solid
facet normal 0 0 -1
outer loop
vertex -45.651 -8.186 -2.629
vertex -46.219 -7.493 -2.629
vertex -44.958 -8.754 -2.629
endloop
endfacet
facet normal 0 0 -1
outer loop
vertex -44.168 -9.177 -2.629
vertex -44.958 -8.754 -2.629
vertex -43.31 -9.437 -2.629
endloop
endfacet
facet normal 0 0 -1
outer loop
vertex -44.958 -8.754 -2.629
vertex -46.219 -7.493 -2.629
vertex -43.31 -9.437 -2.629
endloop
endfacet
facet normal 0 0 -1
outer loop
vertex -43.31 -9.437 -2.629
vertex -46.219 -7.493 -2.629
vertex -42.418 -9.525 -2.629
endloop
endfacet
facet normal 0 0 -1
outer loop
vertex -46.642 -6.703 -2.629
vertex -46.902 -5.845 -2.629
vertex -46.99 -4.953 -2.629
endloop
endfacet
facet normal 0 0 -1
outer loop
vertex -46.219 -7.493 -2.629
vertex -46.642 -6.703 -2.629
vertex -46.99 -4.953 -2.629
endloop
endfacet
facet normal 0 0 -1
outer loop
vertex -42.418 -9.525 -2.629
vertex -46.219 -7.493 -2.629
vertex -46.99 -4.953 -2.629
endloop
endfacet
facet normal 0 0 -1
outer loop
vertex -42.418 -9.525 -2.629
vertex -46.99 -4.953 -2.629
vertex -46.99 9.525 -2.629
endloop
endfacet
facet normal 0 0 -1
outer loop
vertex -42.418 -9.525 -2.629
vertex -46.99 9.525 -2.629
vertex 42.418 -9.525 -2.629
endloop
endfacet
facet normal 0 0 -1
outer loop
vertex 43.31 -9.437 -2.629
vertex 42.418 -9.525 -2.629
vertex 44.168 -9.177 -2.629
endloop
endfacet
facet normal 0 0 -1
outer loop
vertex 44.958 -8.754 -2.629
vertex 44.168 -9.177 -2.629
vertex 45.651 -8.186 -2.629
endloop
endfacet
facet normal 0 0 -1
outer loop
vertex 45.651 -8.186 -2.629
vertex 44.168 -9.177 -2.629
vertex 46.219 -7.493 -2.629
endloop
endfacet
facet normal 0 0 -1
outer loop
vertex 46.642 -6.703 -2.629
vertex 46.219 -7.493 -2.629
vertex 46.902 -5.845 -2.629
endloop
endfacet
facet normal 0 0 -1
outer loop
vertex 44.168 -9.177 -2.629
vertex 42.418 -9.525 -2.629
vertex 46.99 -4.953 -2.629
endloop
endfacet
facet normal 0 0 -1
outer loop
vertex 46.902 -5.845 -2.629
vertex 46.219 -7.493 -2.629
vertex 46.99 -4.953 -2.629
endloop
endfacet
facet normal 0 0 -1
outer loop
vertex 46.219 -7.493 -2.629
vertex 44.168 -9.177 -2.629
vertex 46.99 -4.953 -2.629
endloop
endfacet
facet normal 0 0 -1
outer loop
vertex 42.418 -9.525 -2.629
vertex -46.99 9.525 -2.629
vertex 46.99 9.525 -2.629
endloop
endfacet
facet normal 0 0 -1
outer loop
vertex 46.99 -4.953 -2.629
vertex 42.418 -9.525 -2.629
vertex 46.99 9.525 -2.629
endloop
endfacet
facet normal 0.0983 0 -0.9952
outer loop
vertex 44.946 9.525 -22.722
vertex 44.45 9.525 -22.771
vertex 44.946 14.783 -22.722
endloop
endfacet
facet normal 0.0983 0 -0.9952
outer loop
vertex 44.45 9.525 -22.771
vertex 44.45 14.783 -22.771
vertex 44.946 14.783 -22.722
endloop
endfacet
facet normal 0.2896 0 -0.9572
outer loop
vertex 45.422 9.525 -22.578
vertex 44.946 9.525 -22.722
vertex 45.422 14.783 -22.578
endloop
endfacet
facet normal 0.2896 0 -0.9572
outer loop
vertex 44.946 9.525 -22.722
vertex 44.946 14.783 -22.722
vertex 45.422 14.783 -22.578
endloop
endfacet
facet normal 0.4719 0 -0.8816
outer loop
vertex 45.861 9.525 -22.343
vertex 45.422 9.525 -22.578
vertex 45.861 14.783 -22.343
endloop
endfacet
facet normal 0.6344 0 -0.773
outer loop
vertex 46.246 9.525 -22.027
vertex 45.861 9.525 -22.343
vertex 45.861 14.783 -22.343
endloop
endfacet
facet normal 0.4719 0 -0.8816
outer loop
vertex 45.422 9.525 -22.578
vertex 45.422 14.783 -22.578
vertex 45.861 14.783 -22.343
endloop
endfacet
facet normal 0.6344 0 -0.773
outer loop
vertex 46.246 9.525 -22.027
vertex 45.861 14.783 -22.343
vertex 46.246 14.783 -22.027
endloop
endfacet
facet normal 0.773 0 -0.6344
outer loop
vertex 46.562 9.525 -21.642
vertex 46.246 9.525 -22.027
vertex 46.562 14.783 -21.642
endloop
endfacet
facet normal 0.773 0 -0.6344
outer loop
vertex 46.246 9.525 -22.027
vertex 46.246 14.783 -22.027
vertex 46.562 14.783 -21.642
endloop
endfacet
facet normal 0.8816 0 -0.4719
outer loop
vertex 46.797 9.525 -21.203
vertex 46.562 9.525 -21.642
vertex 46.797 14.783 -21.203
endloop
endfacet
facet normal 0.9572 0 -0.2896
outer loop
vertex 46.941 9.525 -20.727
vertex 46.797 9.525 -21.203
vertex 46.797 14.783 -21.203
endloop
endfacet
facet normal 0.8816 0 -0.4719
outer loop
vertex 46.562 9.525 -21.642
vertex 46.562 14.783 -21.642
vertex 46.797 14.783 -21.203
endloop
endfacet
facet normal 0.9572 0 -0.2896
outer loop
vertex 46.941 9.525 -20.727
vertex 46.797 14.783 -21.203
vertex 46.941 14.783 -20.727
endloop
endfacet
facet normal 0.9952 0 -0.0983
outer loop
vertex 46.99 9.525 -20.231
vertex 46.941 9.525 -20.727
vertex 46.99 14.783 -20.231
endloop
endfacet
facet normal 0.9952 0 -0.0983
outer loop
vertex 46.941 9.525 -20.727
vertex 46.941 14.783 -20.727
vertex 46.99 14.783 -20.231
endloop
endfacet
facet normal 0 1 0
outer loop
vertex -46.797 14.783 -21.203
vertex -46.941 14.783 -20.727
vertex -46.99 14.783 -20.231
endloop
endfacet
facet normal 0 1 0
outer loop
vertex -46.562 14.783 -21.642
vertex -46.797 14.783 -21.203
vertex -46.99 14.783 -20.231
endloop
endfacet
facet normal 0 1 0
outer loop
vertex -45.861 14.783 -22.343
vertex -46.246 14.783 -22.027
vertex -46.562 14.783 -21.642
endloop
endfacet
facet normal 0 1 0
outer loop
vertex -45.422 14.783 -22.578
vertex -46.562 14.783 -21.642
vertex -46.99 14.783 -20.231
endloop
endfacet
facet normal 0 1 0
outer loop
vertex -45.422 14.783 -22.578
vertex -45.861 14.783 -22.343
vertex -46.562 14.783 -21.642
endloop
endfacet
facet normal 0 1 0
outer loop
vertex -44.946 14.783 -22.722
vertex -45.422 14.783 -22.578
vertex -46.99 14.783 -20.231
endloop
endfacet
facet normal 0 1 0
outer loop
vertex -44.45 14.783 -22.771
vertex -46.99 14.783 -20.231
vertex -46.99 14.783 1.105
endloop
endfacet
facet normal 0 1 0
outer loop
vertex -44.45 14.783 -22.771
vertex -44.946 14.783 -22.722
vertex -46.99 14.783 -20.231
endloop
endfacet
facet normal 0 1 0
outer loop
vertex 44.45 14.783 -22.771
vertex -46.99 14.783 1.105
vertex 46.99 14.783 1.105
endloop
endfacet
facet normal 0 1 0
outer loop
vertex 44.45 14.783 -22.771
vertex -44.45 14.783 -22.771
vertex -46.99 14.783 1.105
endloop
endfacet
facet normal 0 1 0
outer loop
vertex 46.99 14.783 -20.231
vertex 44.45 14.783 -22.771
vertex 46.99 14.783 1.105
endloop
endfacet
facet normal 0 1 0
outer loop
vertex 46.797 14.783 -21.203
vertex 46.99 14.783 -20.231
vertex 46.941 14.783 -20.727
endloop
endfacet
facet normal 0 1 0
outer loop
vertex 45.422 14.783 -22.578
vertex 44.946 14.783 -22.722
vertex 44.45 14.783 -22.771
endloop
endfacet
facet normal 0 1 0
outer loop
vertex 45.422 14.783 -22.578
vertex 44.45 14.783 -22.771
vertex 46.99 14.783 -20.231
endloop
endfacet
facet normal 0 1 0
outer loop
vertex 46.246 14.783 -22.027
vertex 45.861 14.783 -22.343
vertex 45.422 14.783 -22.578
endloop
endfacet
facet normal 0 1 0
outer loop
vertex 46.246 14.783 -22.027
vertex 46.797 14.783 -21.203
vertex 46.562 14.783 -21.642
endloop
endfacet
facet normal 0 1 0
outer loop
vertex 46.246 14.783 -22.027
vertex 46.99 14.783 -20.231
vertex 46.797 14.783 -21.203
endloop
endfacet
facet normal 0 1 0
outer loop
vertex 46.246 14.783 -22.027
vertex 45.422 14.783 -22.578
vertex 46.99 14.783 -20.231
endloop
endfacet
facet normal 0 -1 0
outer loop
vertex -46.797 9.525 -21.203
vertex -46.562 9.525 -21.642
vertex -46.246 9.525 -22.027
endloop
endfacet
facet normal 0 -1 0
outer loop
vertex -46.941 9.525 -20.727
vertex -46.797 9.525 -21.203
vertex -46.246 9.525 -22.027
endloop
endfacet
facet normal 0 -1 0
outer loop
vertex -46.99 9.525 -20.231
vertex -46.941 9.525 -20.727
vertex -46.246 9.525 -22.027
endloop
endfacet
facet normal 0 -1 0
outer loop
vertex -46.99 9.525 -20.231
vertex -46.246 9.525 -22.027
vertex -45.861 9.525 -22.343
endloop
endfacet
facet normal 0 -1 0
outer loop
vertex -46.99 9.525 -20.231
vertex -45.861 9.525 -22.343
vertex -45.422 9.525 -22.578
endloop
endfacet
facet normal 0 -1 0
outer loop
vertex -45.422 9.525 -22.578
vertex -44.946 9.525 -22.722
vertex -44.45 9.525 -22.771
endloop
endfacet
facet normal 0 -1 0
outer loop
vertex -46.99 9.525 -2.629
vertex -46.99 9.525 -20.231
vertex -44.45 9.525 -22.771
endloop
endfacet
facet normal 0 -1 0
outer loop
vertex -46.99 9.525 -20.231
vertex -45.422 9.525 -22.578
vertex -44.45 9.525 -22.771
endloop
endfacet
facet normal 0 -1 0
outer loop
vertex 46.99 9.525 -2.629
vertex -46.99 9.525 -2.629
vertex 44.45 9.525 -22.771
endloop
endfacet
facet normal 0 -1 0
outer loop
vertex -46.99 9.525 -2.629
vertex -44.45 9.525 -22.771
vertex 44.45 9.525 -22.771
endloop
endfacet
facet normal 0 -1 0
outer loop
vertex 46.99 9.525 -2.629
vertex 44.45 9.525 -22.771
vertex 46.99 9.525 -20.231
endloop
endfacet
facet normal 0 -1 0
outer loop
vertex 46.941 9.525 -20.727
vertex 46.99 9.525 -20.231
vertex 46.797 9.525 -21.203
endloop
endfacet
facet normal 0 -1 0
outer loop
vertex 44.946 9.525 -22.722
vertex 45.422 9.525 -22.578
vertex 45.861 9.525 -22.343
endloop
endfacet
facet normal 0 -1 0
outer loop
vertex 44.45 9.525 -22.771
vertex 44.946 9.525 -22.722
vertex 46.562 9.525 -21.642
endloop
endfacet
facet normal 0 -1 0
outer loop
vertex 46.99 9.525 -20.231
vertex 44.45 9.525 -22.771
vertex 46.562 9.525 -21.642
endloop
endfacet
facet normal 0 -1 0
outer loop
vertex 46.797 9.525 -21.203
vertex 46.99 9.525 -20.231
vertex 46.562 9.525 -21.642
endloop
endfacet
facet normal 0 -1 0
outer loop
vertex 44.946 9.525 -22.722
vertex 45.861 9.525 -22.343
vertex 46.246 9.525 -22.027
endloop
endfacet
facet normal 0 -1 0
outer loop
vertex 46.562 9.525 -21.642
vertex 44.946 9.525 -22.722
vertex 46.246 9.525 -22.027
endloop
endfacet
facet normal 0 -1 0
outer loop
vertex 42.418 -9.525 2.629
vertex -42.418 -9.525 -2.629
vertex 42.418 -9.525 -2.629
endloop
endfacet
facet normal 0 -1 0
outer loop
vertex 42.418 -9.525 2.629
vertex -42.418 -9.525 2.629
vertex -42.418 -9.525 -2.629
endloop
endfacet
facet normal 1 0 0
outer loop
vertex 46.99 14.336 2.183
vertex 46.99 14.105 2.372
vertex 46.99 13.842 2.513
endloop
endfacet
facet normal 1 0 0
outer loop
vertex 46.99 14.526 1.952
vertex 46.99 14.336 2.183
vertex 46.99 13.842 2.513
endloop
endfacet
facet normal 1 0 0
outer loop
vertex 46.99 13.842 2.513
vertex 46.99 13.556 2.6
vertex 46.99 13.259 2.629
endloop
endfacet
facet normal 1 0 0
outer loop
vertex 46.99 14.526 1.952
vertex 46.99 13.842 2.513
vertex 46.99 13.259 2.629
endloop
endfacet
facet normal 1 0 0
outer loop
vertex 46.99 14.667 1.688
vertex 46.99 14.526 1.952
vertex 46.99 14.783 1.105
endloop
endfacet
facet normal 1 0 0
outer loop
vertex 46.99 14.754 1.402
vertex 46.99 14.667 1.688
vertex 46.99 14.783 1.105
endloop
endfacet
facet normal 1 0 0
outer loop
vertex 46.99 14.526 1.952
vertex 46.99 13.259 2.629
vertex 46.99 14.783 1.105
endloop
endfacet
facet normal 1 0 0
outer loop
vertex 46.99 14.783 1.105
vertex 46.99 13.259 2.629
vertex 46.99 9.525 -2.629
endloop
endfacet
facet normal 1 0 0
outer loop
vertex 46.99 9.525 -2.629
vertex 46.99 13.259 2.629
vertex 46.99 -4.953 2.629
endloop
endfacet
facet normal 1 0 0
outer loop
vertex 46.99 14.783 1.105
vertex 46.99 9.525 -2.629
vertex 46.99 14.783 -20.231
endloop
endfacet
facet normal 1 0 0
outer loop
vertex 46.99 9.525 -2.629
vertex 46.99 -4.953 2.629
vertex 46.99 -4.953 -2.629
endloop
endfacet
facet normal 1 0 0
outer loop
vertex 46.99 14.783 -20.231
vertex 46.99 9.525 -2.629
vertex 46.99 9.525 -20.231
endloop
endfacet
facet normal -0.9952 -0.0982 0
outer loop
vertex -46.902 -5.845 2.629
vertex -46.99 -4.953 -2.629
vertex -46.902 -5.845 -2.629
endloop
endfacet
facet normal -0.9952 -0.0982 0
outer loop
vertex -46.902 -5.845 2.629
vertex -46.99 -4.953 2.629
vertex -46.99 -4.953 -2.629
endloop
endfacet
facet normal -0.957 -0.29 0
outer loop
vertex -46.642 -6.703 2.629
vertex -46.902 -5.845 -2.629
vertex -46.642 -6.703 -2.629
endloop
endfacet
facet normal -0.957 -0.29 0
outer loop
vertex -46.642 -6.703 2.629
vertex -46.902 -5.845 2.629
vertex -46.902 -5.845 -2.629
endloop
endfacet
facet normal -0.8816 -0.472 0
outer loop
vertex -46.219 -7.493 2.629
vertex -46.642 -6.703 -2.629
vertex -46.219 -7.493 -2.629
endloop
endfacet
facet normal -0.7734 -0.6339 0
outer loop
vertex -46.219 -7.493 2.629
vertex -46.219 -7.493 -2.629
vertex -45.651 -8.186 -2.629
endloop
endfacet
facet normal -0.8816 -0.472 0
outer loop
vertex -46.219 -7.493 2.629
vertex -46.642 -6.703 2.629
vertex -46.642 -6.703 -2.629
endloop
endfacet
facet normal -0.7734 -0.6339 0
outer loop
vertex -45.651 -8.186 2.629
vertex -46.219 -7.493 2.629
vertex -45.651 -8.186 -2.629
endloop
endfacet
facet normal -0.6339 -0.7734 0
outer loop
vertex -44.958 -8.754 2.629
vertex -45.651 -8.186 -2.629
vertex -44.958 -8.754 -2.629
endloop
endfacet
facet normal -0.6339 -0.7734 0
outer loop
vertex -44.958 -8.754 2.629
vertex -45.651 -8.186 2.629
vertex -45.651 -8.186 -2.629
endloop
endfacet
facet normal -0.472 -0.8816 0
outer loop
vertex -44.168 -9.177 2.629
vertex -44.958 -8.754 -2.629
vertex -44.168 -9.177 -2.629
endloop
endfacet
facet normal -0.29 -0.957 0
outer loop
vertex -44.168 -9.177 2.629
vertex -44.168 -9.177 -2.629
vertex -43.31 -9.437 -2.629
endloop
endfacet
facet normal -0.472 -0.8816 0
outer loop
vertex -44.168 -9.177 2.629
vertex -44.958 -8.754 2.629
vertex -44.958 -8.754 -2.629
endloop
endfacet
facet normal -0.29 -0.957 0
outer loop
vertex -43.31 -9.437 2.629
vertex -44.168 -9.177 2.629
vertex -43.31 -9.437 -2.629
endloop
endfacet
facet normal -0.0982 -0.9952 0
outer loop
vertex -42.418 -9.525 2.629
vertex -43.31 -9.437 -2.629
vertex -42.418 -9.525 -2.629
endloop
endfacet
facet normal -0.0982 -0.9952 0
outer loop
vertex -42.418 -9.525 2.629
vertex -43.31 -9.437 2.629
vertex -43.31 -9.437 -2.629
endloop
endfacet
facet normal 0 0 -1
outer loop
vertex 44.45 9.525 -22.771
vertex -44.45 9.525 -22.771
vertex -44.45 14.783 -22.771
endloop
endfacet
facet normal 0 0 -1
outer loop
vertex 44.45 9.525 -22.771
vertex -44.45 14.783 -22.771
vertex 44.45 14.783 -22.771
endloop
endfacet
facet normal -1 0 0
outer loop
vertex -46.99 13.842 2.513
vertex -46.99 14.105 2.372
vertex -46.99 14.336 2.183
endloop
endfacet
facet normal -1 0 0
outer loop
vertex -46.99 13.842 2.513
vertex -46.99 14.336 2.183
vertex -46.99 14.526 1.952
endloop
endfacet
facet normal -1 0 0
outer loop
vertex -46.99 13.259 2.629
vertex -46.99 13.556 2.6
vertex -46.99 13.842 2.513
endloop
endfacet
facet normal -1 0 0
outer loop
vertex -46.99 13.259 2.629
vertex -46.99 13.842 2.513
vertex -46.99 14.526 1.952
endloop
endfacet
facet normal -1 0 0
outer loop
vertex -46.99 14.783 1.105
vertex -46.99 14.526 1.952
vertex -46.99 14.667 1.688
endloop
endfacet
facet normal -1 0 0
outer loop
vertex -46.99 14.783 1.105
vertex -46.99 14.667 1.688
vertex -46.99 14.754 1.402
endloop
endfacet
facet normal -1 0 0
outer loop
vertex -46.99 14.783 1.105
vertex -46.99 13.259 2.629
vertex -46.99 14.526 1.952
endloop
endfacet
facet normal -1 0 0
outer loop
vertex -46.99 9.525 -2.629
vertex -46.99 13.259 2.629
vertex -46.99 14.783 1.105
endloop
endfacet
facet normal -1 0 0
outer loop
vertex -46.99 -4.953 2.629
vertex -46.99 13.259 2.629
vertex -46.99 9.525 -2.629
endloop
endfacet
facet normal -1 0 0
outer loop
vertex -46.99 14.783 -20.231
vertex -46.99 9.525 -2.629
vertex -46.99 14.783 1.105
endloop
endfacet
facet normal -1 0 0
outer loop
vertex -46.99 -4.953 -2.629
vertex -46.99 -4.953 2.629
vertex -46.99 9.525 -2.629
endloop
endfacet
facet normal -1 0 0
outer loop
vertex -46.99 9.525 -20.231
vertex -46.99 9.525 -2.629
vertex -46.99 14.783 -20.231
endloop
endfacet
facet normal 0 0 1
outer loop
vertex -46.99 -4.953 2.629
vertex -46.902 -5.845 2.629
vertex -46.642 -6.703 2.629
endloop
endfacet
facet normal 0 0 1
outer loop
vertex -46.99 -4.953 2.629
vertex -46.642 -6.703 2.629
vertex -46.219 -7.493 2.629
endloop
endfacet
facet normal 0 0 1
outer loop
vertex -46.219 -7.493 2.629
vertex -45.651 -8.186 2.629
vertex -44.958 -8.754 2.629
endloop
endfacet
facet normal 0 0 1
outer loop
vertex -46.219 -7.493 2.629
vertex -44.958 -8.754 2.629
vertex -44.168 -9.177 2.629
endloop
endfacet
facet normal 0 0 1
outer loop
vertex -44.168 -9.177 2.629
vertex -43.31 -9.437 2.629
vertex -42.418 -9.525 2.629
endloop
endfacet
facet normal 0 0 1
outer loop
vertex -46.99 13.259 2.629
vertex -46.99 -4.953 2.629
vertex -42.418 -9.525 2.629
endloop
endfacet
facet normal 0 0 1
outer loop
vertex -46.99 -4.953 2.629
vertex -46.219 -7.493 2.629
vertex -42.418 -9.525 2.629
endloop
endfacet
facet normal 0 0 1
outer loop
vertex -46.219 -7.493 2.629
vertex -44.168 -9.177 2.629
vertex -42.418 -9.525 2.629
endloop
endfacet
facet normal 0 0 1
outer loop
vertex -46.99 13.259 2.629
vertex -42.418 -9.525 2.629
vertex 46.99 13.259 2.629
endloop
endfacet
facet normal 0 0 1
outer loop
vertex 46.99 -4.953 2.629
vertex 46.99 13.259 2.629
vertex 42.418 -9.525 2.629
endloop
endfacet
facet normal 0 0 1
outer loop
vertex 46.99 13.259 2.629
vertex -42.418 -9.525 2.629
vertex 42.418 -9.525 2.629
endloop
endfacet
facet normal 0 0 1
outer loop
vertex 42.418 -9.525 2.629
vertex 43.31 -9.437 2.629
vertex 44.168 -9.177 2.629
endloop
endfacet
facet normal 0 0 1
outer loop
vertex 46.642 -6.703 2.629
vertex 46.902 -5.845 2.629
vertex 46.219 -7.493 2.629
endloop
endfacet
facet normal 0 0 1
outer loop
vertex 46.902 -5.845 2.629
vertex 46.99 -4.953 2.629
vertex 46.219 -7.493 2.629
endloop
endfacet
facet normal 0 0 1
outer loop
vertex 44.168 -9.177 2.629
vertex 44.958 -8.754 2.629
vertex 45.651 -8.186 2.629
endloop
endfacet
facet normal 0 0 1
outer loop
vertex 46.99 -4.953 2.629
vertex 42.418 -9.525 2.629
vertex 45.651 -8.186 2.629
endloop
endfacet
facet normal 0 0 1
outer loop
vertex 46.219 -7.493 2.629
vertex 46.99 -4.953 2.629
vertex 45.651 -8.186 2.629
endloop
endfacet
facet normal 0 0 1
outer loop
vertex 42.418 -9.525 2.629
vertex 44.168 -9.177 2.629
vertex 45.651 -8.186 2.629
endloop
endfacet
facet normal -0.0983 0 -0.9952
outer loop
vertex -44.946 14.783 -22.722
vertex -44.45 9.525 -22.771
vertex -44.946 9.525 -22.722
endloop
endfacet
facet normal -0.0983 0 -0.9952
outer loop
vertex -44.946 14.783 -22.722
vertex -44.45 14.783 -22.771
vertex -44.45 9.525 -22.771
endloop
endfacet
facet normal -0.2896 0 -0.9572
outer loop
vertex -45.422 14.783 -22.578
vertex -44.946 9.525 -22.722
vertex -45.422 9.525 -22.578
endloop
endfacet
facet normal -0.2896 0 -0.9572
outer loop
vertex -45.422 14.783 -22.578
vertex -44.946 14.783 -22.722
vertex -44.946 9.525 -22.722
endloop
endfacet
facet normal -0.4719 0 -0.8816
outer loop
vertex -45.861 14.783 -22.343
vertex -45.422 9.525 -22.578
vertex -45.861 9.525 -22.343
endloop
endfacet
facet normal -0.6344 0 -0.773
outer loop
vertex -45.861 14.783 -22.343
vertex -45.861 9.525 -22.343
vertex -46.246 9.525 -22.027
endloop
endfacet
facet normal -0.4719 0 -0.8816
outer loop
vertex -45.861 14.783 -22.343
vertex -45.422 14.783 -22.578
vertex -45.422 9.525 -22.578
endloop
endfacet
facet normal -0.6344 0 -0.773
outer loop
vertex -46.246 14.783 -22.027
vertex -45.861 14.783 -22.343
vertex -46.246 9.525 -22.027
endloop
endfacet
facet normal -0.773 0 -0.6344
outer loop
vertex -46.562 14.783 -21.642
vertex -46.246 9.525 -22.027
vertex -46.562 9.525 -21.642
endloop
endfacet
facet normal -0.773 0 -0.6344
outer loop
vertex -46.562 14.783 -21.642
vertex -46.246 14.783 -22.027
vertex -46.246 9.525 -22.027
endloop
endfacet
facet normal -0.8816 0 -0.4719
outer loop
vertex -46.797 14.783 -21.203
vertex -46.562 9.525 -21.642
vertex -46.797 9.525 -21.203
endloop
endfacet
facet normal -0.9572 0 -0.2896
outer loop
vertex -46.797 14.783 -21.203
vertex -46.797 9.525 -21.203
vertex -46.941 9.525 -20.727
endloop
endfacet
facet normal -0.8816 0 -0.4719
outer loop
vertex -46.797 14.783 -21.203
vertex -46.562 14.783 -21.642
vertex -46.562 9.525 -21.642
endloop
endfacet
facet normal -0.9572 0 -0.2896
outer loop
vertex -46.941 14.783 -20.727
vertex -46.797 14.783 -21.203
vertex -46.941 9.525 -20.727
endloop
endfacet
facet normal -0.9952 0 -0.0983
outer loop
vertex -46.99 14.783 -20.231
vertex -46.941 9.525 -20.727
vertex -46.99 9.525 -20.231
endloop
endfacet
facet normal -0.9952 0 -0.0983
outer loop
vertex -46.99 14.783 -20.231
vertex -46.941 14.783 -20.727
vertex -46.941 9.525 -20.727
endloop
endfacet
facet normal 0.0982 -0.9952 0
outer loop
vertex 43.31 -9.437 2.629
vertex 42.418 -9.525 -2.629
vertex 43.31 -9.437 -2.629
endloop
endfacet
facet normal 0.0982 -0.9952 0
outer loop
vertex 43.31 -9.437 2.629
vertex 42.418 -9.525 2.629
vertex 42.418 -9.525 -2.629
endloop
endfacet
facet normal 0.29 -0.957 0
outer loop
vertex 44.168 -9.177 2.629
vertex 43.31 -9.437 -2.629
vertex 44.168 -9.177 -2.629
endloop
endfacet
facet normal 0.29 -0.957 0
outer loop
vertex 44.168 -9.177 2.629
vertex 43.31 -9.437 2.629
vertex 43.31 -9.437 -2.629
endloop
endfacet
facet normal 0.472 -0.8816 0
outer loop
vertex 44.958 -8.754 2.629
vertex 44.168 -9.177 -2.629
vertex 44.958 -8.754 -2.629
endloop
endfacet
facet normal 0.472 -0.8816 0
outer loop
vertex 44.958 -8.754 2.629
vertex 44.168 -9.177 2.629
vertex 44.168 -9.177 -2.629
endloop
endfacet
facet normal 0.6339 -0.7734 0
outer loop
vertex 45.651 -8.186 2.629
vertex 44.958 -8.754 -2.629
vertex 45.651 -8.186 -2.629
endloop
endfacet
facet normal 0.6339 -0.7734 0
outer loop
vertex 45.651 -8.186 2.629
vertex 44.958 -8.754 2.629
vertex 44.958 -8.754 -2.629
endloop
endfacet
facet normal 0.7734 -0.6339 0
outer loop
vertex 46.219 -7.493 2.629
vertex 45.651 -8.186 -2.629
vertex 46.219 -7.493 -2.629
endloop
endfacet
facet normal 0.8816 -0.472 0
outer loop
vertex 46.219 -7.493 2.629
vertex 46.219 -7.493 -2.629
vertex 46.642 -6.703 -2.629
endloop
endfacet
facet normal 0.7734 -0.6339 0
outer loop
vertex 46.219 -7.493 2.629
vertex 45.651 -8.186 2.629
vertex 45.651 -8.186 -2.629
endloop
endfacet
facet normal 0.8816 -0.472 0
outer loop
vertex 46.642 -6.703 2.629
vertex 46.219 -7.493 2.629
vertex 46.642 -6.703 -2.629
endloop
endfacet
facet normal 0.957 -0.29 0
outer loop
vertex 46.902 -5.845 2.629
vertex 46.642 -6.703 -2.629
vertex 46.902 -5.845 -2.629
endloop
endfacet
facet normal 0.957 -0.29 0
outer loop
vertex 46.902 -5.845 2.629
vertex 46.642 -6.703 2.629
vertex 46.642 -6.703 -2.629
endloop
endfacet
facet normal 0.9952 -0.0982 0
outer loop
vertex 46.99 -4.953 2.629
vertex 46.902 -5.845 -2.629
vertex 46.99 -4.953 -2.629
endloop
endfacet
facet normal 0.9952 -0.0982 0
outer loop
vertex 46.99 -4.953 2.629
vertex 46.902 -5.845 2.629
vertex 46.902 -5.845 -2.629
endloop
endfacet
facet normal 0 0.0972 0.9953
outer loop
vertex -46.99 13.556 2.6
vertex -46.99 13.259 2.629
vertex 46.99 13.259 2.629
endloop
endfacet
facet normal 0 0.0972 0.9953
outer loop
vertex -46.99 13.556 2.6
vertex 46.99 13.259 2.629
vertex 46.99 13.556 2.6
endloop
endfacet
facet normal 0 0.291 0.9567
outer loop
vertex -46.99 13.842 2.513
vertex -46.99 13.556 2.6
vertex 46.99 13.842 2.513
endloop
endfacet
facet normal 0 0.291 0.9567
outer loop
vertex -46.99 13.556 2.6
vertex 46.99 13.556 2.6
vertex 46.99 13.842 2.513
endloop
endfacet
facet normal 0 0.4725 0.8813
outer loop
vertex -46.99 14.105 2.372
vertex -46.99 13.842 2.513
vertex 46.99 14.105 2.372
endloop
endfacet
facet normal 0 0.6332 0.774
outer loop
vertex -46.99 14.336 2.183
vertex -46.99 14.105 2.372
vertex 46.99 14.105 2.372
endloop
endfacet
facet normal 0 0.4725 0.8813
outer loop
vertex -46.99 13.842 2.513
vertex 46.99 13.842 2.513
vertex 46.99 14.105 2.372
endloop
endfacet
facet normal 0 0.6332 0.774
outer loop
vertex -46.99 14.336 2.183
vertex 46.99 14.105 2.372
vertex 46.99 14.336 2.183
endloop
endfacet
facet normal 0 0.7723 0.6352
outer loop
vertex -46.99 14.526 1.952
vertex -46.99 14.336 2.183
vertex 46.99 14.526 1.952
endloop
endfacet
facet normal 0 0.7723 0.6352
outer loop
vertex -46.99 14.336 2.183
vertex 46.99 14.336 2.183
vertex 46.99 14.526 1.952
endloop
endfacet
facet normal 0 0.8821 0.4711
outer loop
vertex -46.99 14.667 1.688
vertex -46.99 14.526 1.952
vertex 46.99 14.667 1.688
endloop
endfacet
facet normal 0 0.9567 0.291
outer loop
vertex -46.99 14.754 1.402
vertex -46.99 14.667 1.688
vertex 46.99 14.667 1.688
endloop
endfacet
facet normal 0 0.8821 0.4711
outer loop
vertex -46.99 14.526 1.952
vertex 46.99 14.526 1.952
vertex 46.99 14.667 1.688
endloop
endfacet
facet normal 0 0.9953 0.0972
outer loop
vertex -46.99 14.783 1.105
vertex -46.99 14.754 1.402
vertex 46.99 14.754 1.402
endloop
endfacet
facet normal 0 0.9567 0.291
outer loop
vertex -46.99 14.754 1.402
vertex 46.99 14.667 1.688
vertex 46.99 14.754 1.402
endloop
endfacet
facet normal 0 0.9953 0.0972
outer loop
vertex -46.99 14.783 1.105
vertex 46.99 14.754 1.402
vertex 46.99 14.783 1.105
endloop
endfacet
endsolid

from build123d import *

# Parameters (mm, degrees)
SKETCH1_W           = 93.98
SKETCH1_H           = 19.05
BOSS_EXTRUDE1_DEPTH = 2.6289
SKETCH2_W           = 93.98
SKETCH2_H           = 25.4
BOSS_EXTRUDE2_DEPTH = 5.2578
FILLET6_R           = 4.572
FILLET7_R           = 4.572
FILLET8_R           = 1.524
FILLET9_R           = 2.54
FILLET10_R          = 2.54


with BuildPart() as part:
    # Sketch1 → Boss-Extrude1 (new body, symmetric)
    with BuildSketch(Plane.XY):
        Rectangle(SKETCH1_W, SKETCH1_H)
    extrude(amount=BOSS_EXTRUDE1_DEPTH, both=True)

    # Sketch2 → Boss-Extrude2 (add)
    with BuildSketch(Plane(origin=(0, 9.525, 0), x_dir=(1, 0, 0), z_dir=(0, 1, 0))):
        with Locations((0, 10.0711)):
            Rectangle(SKETCH2_W, SKETCH2_H)
    extrude(amount=BOSS_EXTRUDE2_DEPTH)

    # Fillet6
    fillet6_edges = [part.edges().sort_by_distance(p)[0] for p in [
        (-46.99, -9.525, 0),
    ]]
    fillet(fillet6_edges, radius=FILLET6_R)

    # Fillet7
    fillet7_edges = [part.edges().sort_by_distance(p)[0] for p in [
        (46.99, -9.525, 0),
    ]]
    fillet(fillet7_edges, radius=FILLET7_R)

    # Fillet8
    fillet8_edges = [part.edges().sort_by_distance(p)[0] for p in [
        (0, 14.7828, 2.6289),
    ]]
    fillet(fillet8_edges, radius=FILLET8_R)

    # Fillet9
    fillet9_edges = [part.edges().sort_by_distance(p)[0] for p in [
        (-46.99, 12.1539, -22.7711),
    ]]
    fillet(fillet9_edges, radius=FILLET9_R)

    # Fillet10
    fillet10_edges = [part.edges().sort_by_distance(p)[0] for p in [
        (46.99, 12.1539, -22.7711),
    ]]
    fillet(fillet10_edges, radius=FILLET10_R)


solid = part.part
